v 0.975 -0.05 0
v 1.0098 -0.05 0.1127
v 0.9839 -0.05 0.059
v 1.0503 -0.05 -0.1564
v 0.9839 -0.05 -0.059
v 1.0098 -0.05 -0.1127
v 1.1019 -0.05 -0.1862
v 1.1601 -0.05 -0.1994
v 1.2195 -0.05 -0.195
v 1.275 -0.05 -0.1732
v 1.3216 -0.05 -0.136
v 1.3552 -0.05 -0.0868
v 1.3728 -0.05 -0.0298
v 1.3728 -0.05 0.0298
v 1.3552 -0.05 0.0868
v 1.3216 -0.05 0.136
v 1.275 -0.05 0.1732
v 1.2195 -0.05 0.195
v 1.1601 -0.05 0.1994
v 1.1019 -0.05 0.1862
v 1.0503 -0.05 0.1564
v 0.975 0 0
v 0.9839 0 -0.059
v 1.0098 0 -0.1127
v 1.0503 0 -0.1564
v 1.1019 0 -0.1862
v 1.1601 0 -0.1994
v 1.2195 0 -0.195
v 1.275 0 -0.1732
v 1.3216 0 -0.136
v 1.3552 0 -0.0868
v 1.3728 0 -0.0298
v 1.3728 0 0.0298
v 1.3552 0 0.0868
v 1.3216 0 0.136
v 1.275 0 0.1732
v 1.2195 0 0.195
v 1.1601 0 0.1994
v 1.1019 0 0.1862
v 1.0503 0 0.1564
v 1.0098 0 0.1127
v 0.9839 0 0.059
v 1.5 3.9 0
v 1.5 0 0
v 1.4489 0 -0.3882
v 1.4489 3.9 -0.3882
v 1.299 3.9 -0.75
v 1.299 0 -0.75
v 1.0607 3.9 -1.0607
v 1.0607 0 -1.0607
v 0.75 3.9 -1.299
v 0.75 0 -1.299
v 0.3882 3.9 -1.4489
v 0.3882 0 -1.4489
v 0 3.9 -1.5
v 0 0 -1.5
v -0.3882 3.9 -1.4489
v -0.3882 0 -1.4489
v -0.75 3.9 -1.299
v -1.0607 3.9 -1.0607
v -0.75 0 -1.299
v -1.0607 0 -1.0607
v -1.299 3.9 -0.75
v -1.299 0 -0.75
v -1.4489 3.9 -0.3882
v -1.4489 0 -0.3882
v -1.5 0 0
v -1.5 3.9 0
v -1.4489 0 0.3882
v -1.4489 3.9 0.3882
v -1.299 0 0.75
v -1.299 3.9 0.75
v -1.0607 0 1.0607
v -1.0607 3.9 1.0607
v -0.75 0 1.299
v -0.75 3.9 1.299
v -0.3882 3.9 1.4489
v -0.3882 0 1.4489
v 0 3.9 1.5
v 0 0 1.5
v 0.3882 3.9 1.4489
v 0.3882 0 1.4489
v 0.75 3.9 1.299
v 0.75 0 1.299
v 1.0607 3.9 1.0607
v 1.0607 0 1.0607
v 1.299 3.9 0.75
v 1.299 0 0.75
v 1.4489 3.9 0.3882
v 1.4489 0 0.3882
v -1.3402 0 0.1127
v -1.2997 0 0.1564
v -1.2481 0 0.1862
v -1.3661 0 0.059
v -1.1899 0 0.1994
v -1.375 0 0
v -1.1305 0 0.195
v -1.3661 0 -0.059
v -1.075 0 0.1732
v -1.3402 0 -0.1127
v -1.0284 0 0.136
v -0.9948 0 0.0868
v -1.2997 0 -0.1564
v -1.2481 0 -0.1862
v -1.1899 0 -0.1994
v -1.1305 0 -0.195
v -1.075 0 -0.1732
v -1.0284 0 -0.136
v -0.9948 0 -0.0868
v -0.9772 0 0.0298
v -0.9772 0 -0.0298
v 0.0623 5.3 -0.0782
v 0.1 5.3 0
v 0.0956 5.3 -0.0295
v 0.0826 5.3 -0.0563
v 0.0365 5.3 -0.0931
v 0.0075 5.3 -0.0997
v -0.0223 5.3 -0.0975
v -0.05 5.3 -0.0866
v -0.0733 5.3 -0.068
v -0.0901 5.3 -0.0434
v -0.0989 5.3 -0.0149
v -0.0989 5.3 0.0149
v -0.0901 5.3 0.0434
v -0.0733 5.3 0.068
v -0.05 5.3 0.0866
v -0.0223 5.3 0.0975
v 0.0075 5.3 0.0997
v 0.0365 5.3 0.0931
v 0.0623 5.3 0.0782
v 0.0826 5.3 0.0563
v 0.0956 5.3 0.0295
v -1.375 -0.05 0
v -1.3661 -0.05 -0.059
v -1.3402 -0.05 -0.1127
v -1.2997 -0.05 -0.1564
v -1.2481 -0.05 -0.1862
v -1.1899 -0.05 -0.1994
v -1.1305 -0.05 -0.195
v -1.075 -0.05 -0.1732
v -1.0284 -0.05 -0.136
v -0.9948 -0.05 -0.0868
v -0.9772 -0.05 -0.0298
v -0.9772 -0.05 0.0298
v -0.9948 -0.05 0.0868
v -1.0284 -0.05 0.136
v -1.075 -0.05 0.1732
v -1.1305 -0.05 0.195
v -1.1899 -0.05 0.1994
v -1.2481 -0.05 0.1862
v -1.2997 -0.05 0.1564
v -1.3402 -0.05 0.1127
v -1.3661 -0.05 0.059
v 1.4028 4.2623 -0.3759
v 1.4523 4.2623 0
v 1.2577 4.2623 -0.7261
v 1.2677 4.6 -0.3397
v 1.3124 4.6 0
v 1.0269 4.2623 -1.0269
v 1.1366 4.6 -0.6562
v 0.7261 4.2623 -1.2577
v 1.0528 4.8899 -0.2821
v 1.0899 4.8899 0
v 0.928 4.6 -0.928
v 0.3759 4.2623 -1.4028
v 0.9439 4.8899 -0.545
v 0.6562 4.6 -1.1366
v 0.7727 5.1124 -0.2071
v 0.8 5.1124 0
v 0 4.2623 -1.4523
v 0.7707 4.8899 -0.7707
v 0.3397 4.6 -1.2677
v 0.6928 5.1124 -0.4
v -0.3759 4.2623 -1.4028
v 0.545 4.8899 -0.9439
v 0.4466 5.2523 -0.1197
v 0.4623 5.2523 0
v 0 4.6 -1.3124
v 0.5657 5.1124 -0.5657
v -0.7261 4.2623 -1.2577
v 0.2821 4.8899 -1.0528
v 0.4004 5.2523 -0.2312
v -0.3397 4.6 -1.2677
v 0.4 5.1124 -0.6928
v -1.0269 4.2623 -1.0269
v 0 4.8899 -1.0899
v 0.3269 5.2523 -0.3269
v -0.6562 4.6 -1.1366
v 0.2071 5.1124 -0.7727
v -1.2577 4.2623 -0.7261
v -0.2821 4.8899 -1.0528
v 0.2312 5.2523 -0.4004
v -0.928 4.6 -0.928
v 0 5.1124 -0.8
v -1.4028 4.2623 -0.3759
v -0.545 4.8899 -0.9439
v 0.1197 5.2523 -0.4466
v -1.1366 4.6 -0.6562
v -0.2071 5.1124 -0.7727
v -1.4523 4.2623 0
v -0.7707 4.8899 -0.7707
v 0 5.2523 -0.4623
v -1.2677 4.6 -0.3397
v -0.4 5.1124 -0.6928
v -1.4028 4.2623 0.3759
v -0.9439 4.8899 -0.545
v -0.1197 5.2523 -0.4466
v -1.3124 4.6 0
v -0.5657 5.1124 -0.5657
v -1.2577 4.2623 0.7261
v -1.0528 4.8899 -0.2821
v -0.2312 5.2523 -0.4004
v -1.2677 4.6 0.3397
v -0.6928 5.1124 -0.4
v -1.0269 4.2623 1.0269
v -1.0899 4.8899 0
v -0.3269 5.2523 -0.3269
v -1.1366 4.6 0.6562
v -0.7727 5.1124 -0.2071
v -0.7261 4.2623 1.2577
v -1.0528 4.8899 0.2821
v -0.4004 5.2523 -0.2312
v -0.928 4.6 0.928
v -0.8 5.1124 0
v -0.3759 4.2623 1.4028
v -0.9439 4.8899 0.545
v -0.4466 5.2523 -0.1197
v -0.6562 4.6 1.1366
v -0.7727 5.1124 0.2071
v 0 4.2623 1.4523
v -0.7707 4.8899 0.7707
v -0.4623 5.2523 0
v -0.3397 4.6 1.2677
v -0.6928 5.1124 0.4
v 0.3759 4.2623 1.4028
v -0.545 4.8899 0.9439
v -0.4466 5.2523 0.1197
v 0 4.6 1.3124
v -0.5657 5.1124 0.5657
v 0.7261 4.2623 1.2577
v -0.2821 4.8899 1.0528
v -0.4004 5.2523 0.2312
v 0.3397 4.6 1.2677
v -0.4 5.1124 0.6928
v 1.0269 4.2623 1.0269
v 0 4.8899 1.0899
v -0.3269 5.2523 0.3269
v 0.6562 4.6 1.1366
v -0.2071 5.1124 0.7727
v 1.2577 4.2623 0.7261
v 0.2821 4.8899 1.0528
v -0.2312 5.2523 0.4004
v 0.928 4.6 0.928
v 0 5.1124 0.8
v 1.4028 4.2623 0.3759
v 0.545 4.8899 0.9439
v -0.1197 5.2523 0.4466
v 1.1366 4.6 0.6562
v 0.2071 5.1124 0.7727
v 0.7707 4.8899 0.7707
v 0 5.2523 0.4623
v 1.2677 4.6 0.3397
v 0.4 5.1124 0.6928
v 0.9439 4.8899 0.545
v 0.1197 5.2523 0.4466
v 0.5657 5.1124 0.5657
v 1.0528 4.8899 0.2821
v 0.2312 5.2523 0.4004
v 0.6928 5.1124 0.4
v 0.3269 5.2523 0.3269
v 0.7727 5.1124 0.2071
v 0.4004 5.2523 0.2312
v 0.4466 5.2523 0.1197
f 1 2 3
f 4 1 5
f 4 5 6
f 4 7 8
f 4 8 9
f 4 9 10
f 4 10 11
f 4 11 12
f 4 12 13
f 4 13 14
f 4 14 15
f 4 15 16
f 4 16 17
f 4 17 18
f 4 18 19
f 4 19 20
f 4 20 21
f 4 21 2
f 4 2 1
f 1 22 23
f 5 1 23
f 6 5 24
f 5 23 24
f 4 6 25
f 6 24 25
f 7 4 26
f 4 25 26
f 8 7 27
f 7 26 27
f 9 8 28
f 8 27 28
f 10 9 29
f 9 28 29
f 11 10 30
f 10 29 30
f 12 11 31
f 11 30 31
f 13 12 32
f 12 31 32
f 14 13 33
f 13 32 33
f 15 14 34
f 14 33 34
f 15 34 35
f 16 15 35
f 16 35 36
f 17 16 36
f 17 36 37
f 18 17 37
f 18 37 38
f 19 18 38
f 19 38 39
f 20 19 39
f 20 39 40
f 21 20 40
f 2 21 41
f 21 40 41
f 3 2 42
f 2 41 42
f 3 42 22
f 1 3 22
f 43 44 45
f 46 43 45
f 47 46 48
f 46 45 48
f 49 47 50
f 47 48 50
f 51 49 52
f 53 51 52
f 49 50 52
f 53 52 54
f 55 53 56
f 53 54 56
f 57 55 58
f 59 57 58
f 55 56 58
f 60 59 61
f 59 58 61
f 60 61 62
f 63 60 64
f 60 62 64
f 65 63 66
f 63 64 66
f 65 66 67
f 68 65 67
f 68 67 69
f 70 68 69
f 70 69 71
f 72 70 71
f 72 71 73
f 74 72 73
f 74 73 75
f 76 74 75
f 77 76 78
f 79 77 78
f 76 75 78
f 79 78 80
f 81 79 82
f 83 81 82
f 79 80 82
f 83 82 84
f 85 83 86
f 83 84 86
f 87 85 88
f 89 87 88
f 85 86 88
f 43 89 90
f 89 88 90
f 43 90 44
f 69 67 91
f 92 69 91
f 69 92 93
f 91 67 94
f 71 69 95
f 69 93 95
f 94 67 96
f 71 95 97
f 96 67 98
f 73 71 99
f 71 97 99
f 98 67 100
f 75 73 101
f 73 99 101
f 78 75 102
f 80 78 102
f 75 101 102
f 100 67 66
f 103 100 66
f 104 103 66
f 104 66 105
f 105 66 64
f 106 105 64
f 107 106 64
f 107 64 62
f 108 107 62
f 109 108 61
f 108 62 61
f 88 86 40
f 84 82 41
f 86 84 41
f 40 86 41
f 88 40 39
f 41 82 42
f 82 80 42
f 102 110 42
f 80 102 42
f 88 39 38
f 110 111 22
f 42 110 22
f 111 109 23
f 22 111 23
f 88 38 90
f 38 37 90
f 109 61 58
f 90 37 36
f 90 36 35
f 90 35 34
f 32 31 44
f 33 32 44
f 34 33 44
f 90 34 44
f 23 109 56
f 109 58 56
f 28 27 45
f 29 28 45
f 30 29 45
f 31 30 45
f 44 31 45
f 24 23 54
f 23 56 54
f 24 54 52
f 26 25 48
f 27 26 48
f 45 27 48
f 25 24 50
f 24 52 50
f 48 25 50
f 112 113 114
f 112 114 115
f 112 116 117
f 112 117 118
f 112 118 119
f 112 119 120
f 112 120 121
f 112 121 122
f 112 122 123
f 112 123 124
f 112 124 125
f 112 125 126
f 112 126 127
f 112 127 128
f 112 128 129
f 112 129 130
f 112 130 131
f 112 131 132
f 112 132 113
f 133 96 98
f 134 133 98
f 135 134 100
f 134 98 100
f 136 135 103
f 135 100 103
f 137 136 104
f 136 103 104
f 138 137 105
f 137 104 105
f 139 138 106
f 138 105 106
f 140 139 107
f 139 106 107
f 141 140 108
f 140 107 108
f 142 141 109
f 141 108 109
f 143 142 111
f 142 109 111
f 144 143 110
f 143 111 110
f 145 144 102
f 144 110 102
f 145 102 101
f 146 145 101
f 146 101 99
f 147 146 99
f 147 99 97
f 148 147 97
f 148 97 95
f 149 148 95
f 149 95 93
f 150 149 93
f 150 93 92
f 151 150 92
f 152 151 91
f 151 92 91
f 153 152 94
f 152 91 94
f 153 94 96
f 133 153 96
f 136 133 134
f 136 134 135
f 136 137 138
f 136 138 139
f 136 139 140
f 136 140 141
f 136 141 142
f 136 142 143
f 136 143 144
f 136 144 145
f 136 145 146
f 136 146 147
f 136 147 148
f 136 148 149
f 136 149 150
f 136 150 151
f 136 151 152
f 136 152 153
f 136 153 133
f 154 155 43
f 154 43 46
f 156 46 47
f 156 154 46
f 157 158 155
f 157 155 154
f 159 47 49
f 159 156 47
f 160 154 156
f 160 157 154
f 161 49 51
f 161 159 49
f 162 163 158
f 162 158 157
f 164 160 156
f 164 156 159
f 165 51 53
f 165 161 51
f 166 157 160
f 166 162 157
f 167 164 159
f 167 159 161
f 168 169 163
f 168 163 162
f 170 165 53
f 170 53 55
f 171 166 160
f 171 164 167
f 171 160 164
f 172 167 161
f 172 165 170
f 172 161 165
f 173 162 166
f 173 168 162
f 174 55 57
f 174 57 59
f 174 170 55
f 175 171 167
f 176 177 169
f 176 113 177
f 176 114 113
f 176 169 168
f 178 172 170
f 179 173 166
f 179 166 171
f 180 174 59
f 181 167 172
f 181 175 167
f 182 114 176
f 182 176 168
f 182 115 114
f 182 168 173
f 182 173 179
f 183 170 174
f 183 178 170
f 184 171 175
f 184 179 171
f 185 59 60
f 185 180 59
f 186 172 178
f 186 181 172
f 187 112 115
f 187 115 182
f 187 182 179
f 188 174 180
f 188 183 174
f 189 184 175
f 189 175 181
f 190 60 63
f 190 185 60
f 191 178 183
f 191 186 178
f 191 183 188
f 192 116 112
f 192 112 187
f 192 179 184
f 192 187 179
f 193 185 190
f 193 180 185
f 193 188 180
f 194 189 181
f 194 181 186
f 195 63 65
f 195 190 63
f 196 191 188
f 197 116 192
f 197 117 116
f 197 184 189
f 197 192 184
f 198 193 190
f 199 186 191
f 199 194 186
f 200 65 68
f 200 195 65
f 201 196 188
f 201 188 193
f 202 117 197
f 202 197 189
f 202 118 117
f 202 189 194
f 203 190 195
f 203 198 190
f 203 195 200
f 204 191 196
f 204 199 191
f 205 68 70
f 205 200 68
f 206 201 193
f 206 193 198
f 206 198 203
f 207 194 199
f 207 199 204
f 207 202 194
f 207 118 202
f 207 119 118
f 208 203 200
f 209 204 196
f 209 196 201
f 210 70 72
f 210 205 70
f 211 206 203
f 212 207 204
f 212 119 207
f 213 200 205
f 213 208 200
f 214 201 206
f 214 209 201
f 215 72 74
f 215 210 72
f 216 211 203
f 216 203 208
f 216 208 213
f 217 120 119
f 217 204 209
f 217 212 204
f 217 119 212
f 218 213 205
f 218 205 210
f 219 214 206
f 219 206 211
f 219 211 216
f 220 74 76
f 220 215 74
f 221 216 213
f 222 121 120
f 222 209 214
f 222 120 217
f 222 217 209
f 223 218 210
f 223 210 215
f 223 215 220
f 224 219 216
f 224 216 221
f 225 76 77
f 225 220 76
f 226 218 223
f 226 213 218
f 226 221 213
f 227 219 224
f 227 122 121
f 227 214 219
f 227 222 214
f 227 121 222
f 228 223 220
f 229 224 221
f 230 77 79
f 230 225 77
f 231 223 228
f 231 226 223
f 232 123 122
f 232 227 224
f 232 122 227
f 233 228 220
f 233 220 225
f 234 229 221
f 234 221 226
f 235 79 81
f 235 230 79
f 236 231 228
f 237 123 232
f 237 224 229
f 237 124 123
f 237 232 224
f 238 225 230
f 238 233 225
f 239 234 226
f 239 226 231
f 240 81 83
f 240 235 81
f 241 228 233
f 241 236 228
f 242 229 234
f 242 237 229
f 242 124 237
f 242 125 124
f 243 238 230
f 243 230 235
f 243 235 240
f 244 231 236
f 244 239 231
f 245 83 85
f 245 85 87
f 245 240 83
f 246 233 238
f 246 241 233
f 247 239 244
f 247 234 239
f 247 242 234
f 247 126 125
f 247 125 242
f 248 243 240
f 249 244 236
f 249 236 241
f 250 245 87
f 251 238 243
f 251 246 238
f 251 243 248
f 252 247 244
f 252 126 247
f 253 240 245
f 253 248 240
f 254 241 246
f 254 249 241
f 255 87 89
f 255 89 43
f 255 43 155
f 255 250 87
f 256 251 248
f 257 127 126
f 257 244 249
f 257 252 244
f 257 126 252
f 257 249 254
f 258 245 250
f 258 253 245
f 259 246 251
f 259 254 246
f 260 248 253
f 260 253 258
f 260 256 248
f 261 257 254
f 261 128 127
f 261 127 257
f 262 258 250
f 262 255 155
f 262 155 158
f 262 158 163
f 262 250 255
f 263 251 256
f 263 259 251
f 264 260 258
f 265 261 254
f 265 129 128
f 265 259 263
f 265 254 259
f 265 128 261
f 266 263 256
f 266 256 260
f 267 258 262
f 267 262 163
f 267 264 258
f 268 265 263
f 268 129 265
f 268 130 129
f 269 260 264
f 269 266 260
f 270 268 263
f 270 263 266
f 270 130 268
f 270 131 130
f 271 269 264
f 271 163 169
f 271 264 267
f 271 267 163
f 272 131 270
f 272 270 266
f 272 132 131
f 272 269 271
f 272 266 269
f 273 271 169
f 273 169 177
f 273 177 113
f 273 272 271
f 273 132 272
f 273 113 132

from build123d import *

# Parameters (mm, degrees)
SKETCH2_R                  = 1.5
BOSS_EXTRUDE1_DEPTH        = 5.3
FILLET1_R                  = 1.4
BOSS_EXTRUDE2_DEPTH        = 0.25
BOSS_EXTRUDE2_DEPTH_BACK   = 0.25
BOSS_EXTRUDE2_2_DEPTH      = 0.25
BOSS_EXTRUDE2_2_DEPTH_BACK = 0.25
SKETCH4_R                  = 0.2
BOSS_EXTRUDE3_DEPTH        = 0.05


with BuildPart() as part:
    # Sketch2 → Boss-Extrude1 (new body)
    with BuildSketch(Plane(origin=(0, 0, 0), x_dir=(1, 0, 0), z_dir=(0, 1, 0))):
        Circle(SKETCH2_R)
    extrude(amount=BOSS_EXTRUDE1_DEPTH)

    # Fillet1
    fillet1_edges = [part.edges().sort_by_distance(p)[0] for p in [
        (-1.5, 5.3, 0),
    ]]
    fillet(fillet1_edges, radius=FILLET1_R)



with BuildPart() as body_2:
    # Sketch3 → Boss-Extrude2 (new, two sides: drawn at the far end of the back side and taken through both)
    with BuildSketch(Plane.XY.offset(-BOSS_EXTRUDE2_DEPTH_BACK)):
        Polygon((-1.45, 2.6), (-1.45, 0), (-0.9, 0), (-0.9, 0.6), (-0.624114196, 0.6), (-0.624114196, 0.82503781), (-1.225355096, 2.6), align=None)
    extrude(amount=BOSS_EXTRUDE2_DEPTH + BOSS_EXTRUDE2_DEPTH_BACK)


with BuildPart() as body_3:
    # Sketch3 → Boss-Extrude2 2 (new, two sides: drawn at the far end of the back side and taken through both)
    with BuildSketch(Plane.XY.offset(-BOSS_EXTRUDE2_2_DEPTH_BACK)):
        Polygon((1.45, 2.6), (-0.872452828, 2.6), (0.496677266, 0.6), (0.9, 0.6), (0.9, 0), (1.45, 0), align=None)
    extrude(amount=BOSS_EXTRUDE2_2_DEPTH + BOSS_EXTRUDE2_2_DEPTH_BACK)


with BuildPart() as part_1:
    add(part.part)

    add(body_2.part)  # Boss-Extrude3 merges body 2

    add(body_3.part)  # Boss-Extrude3 merges body 3
    # Sketch4 → Boss-Extrude3 (add)
    with BuildSketch(Plane(origin=(0, 0, 0), x_dir=(-1, 0, 0), z_dir=(0, -1, 0))):
        with Locations((-1.175, 0)):
            Circle(SKETCH4_R)
        with Locations((1.175, 0)):
            Circle(SKETCH4_R)
    extrude(amount=BOSS_EXTRUDE3_DEPTH)


solid = part_1.part
